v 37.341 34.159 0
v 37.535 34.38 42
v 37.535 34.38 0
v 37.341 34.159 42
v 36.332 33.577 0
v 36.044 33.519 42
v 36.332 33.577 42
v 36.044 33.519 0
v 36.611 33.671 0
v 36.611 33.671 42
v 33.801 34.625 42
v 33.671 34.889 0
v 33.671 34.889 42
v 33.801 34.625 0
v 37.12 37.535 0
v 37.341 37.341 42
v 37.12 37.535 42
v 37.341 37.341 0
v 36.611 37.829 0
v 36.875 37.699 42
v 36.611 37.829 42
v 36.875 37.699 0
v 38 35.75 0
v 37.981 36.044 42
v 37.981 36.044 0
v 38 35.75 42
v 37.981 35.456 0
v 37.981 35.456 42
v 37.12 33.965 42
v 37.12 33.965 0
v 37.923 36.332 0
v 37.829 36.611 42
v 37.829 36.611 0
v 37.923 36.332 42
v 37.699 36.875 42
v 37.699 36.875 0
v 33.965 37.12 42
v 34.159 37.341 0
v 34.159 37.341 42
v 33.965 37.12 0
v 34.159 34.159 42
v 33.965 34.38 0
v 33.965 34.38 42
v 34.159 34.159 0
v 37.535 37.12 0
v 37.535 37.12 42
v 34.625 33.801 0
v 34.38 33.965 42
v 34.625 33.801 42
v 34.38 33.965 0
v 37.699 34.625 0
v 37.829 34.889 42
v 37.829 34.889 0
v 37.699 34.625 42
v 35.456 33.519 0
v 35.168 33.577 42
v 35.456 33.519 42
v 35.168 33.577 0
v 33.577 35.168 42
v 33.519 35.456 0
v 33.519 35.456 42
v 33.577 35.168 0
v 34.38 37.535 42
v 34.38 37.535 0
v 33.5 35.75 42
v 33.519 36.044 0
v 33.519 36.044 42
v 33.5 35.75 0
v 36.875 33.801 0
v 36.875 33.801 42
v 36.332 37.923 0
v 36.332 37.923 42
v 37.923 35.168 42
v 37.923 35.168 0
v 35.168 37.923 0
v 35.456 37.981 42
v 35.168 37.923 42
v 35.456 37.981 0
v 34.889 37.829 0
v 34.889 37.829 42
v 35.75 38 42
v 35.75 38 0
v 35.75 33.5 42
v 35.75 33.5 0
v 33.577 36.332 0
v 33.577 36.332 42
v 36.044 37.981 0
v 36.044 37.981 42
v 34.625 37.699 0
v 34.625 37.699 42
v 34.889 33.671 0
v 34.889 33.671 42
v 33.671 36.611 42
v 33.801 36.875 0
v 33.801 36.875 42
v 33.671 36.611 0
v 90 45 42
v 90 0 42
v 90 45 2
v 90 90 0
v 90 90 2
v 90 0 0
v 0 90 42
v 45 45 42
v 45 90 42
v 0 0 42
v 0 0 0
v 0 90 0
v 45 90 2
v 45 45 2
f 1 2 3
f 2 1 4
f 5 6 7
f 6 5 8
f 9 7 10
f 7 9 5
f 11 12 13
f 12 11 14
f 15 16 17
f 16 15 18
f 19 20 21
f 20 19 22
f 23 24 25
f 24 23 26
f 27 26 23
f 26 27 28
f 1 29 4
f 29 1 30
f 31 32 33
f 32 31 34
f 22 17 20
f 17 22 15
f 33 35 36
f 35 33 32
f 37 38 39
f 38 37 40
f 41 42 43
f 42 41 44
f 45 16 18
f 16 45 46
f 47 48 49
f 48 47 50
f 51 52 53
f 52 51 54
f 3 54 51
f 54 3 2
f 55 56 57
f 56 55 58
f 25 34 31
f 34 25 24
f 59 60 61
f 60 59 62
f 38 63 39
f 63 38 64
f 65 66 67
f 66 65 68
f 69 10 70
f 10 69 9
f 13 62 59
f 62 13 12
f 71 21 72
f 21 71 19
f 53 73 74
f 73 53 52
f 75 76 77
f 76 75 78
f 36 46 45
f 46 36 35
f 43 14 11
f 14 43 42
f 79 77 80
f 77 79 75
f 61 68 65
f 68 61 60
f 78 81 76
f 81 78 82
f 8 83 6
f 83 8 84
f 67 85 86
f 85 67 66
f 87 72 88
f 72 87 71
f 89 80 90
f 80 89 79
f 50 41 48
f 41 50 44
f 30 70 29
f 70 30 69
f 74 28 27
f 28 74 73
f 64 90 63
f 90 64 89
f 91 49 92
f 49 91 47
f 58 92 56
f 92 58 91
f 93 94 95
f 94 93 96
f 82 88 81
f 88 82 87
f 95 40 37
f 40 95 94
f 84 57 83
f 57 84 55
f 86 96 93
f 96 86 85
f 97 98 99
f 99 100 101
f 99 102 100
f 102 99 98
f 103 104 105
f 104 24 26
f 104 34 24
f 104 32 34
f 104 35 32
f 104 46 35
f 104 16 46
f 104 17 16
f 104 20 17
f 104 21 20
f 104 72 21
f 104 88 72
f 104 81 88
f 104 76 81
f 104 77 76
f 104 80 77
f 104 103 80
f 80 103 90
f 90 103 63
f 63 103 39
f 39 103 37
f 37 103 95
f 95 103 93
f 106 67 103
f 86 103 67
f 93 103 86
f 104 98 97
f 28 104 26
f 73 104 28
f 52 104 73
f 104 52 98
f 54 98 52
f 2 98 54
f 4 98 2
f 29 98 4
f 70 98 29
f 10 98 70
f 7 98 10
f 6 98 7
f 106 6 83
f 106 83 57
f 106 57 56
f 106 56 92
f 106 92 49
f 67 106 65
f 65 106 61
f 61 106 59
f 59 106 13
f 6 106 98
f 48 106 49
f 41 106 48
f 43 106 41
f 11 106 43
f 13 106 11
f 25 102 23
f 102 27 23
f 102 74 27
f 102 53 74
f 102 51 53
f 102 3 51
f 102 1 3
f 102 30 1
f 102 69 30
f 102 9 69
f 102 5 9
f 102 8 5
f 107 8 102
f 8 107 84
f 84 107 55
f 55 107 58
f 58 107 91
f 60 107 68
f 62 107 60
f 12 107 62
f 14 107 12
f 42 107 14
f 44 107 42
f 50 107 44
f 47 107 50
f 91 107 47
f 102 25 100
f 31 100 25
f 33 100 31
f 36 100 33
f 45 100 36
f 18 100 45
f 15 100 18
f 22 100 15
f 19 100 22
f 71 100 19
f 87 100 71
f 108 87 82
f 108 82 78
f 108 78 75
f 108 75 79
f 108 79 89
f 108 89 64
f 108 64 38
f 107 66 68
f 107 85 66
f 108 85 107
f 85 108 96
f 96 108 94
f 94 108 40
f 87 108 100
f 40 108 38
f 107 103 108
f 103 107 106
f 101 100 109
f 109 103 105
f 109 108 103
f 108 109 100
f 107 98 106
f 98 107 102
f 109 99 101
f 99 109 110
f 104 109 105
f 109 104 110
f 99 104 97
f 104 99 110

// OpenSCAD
// Fan cover - an open box (top open) that mounts over a round PC case fan to turn it into a
// magnetic stirrer. The top plate is the stirring surface. This is the print orientation: the
// top plate lies on the bed (z = 0) and the walls rise upward.
//

top     = 90;
width   = 90;
height  = 40;
wall    = 2.5;
screw   = 4.5;
pattern = 71.5;
notch   = 12;

$fn = 48;

plate_h = 2;

difference() {
    cube([top, width, height + plate_h]);
    translate([top / 2, width / 2, plate_h]) cube([top, width, height]);       // hollow inside
    for (x = [-pattern / 2, pattern / 2])
        for (y = [-pattern / 2, pattern / 2])
            translate([x, y, -1]) cylinder(h = height + plate_h + 2, d = screw);  // screw holes
    translate([top / 2, width / 2, height - 10]) cube([top, width, 10]);        // block one wall end
    translate([top / 2, width / 2, height - 10]) cube([top, width, 10]);        // block the opposite wall end
    translate([top / 2, width / 2, height - 10]) cube([top, width, 10]);        // block the opposite wall end
    translate([top / 2, width / 2, height - 10]) cube([top, width, 10]);        // block the opposite wall end
}
